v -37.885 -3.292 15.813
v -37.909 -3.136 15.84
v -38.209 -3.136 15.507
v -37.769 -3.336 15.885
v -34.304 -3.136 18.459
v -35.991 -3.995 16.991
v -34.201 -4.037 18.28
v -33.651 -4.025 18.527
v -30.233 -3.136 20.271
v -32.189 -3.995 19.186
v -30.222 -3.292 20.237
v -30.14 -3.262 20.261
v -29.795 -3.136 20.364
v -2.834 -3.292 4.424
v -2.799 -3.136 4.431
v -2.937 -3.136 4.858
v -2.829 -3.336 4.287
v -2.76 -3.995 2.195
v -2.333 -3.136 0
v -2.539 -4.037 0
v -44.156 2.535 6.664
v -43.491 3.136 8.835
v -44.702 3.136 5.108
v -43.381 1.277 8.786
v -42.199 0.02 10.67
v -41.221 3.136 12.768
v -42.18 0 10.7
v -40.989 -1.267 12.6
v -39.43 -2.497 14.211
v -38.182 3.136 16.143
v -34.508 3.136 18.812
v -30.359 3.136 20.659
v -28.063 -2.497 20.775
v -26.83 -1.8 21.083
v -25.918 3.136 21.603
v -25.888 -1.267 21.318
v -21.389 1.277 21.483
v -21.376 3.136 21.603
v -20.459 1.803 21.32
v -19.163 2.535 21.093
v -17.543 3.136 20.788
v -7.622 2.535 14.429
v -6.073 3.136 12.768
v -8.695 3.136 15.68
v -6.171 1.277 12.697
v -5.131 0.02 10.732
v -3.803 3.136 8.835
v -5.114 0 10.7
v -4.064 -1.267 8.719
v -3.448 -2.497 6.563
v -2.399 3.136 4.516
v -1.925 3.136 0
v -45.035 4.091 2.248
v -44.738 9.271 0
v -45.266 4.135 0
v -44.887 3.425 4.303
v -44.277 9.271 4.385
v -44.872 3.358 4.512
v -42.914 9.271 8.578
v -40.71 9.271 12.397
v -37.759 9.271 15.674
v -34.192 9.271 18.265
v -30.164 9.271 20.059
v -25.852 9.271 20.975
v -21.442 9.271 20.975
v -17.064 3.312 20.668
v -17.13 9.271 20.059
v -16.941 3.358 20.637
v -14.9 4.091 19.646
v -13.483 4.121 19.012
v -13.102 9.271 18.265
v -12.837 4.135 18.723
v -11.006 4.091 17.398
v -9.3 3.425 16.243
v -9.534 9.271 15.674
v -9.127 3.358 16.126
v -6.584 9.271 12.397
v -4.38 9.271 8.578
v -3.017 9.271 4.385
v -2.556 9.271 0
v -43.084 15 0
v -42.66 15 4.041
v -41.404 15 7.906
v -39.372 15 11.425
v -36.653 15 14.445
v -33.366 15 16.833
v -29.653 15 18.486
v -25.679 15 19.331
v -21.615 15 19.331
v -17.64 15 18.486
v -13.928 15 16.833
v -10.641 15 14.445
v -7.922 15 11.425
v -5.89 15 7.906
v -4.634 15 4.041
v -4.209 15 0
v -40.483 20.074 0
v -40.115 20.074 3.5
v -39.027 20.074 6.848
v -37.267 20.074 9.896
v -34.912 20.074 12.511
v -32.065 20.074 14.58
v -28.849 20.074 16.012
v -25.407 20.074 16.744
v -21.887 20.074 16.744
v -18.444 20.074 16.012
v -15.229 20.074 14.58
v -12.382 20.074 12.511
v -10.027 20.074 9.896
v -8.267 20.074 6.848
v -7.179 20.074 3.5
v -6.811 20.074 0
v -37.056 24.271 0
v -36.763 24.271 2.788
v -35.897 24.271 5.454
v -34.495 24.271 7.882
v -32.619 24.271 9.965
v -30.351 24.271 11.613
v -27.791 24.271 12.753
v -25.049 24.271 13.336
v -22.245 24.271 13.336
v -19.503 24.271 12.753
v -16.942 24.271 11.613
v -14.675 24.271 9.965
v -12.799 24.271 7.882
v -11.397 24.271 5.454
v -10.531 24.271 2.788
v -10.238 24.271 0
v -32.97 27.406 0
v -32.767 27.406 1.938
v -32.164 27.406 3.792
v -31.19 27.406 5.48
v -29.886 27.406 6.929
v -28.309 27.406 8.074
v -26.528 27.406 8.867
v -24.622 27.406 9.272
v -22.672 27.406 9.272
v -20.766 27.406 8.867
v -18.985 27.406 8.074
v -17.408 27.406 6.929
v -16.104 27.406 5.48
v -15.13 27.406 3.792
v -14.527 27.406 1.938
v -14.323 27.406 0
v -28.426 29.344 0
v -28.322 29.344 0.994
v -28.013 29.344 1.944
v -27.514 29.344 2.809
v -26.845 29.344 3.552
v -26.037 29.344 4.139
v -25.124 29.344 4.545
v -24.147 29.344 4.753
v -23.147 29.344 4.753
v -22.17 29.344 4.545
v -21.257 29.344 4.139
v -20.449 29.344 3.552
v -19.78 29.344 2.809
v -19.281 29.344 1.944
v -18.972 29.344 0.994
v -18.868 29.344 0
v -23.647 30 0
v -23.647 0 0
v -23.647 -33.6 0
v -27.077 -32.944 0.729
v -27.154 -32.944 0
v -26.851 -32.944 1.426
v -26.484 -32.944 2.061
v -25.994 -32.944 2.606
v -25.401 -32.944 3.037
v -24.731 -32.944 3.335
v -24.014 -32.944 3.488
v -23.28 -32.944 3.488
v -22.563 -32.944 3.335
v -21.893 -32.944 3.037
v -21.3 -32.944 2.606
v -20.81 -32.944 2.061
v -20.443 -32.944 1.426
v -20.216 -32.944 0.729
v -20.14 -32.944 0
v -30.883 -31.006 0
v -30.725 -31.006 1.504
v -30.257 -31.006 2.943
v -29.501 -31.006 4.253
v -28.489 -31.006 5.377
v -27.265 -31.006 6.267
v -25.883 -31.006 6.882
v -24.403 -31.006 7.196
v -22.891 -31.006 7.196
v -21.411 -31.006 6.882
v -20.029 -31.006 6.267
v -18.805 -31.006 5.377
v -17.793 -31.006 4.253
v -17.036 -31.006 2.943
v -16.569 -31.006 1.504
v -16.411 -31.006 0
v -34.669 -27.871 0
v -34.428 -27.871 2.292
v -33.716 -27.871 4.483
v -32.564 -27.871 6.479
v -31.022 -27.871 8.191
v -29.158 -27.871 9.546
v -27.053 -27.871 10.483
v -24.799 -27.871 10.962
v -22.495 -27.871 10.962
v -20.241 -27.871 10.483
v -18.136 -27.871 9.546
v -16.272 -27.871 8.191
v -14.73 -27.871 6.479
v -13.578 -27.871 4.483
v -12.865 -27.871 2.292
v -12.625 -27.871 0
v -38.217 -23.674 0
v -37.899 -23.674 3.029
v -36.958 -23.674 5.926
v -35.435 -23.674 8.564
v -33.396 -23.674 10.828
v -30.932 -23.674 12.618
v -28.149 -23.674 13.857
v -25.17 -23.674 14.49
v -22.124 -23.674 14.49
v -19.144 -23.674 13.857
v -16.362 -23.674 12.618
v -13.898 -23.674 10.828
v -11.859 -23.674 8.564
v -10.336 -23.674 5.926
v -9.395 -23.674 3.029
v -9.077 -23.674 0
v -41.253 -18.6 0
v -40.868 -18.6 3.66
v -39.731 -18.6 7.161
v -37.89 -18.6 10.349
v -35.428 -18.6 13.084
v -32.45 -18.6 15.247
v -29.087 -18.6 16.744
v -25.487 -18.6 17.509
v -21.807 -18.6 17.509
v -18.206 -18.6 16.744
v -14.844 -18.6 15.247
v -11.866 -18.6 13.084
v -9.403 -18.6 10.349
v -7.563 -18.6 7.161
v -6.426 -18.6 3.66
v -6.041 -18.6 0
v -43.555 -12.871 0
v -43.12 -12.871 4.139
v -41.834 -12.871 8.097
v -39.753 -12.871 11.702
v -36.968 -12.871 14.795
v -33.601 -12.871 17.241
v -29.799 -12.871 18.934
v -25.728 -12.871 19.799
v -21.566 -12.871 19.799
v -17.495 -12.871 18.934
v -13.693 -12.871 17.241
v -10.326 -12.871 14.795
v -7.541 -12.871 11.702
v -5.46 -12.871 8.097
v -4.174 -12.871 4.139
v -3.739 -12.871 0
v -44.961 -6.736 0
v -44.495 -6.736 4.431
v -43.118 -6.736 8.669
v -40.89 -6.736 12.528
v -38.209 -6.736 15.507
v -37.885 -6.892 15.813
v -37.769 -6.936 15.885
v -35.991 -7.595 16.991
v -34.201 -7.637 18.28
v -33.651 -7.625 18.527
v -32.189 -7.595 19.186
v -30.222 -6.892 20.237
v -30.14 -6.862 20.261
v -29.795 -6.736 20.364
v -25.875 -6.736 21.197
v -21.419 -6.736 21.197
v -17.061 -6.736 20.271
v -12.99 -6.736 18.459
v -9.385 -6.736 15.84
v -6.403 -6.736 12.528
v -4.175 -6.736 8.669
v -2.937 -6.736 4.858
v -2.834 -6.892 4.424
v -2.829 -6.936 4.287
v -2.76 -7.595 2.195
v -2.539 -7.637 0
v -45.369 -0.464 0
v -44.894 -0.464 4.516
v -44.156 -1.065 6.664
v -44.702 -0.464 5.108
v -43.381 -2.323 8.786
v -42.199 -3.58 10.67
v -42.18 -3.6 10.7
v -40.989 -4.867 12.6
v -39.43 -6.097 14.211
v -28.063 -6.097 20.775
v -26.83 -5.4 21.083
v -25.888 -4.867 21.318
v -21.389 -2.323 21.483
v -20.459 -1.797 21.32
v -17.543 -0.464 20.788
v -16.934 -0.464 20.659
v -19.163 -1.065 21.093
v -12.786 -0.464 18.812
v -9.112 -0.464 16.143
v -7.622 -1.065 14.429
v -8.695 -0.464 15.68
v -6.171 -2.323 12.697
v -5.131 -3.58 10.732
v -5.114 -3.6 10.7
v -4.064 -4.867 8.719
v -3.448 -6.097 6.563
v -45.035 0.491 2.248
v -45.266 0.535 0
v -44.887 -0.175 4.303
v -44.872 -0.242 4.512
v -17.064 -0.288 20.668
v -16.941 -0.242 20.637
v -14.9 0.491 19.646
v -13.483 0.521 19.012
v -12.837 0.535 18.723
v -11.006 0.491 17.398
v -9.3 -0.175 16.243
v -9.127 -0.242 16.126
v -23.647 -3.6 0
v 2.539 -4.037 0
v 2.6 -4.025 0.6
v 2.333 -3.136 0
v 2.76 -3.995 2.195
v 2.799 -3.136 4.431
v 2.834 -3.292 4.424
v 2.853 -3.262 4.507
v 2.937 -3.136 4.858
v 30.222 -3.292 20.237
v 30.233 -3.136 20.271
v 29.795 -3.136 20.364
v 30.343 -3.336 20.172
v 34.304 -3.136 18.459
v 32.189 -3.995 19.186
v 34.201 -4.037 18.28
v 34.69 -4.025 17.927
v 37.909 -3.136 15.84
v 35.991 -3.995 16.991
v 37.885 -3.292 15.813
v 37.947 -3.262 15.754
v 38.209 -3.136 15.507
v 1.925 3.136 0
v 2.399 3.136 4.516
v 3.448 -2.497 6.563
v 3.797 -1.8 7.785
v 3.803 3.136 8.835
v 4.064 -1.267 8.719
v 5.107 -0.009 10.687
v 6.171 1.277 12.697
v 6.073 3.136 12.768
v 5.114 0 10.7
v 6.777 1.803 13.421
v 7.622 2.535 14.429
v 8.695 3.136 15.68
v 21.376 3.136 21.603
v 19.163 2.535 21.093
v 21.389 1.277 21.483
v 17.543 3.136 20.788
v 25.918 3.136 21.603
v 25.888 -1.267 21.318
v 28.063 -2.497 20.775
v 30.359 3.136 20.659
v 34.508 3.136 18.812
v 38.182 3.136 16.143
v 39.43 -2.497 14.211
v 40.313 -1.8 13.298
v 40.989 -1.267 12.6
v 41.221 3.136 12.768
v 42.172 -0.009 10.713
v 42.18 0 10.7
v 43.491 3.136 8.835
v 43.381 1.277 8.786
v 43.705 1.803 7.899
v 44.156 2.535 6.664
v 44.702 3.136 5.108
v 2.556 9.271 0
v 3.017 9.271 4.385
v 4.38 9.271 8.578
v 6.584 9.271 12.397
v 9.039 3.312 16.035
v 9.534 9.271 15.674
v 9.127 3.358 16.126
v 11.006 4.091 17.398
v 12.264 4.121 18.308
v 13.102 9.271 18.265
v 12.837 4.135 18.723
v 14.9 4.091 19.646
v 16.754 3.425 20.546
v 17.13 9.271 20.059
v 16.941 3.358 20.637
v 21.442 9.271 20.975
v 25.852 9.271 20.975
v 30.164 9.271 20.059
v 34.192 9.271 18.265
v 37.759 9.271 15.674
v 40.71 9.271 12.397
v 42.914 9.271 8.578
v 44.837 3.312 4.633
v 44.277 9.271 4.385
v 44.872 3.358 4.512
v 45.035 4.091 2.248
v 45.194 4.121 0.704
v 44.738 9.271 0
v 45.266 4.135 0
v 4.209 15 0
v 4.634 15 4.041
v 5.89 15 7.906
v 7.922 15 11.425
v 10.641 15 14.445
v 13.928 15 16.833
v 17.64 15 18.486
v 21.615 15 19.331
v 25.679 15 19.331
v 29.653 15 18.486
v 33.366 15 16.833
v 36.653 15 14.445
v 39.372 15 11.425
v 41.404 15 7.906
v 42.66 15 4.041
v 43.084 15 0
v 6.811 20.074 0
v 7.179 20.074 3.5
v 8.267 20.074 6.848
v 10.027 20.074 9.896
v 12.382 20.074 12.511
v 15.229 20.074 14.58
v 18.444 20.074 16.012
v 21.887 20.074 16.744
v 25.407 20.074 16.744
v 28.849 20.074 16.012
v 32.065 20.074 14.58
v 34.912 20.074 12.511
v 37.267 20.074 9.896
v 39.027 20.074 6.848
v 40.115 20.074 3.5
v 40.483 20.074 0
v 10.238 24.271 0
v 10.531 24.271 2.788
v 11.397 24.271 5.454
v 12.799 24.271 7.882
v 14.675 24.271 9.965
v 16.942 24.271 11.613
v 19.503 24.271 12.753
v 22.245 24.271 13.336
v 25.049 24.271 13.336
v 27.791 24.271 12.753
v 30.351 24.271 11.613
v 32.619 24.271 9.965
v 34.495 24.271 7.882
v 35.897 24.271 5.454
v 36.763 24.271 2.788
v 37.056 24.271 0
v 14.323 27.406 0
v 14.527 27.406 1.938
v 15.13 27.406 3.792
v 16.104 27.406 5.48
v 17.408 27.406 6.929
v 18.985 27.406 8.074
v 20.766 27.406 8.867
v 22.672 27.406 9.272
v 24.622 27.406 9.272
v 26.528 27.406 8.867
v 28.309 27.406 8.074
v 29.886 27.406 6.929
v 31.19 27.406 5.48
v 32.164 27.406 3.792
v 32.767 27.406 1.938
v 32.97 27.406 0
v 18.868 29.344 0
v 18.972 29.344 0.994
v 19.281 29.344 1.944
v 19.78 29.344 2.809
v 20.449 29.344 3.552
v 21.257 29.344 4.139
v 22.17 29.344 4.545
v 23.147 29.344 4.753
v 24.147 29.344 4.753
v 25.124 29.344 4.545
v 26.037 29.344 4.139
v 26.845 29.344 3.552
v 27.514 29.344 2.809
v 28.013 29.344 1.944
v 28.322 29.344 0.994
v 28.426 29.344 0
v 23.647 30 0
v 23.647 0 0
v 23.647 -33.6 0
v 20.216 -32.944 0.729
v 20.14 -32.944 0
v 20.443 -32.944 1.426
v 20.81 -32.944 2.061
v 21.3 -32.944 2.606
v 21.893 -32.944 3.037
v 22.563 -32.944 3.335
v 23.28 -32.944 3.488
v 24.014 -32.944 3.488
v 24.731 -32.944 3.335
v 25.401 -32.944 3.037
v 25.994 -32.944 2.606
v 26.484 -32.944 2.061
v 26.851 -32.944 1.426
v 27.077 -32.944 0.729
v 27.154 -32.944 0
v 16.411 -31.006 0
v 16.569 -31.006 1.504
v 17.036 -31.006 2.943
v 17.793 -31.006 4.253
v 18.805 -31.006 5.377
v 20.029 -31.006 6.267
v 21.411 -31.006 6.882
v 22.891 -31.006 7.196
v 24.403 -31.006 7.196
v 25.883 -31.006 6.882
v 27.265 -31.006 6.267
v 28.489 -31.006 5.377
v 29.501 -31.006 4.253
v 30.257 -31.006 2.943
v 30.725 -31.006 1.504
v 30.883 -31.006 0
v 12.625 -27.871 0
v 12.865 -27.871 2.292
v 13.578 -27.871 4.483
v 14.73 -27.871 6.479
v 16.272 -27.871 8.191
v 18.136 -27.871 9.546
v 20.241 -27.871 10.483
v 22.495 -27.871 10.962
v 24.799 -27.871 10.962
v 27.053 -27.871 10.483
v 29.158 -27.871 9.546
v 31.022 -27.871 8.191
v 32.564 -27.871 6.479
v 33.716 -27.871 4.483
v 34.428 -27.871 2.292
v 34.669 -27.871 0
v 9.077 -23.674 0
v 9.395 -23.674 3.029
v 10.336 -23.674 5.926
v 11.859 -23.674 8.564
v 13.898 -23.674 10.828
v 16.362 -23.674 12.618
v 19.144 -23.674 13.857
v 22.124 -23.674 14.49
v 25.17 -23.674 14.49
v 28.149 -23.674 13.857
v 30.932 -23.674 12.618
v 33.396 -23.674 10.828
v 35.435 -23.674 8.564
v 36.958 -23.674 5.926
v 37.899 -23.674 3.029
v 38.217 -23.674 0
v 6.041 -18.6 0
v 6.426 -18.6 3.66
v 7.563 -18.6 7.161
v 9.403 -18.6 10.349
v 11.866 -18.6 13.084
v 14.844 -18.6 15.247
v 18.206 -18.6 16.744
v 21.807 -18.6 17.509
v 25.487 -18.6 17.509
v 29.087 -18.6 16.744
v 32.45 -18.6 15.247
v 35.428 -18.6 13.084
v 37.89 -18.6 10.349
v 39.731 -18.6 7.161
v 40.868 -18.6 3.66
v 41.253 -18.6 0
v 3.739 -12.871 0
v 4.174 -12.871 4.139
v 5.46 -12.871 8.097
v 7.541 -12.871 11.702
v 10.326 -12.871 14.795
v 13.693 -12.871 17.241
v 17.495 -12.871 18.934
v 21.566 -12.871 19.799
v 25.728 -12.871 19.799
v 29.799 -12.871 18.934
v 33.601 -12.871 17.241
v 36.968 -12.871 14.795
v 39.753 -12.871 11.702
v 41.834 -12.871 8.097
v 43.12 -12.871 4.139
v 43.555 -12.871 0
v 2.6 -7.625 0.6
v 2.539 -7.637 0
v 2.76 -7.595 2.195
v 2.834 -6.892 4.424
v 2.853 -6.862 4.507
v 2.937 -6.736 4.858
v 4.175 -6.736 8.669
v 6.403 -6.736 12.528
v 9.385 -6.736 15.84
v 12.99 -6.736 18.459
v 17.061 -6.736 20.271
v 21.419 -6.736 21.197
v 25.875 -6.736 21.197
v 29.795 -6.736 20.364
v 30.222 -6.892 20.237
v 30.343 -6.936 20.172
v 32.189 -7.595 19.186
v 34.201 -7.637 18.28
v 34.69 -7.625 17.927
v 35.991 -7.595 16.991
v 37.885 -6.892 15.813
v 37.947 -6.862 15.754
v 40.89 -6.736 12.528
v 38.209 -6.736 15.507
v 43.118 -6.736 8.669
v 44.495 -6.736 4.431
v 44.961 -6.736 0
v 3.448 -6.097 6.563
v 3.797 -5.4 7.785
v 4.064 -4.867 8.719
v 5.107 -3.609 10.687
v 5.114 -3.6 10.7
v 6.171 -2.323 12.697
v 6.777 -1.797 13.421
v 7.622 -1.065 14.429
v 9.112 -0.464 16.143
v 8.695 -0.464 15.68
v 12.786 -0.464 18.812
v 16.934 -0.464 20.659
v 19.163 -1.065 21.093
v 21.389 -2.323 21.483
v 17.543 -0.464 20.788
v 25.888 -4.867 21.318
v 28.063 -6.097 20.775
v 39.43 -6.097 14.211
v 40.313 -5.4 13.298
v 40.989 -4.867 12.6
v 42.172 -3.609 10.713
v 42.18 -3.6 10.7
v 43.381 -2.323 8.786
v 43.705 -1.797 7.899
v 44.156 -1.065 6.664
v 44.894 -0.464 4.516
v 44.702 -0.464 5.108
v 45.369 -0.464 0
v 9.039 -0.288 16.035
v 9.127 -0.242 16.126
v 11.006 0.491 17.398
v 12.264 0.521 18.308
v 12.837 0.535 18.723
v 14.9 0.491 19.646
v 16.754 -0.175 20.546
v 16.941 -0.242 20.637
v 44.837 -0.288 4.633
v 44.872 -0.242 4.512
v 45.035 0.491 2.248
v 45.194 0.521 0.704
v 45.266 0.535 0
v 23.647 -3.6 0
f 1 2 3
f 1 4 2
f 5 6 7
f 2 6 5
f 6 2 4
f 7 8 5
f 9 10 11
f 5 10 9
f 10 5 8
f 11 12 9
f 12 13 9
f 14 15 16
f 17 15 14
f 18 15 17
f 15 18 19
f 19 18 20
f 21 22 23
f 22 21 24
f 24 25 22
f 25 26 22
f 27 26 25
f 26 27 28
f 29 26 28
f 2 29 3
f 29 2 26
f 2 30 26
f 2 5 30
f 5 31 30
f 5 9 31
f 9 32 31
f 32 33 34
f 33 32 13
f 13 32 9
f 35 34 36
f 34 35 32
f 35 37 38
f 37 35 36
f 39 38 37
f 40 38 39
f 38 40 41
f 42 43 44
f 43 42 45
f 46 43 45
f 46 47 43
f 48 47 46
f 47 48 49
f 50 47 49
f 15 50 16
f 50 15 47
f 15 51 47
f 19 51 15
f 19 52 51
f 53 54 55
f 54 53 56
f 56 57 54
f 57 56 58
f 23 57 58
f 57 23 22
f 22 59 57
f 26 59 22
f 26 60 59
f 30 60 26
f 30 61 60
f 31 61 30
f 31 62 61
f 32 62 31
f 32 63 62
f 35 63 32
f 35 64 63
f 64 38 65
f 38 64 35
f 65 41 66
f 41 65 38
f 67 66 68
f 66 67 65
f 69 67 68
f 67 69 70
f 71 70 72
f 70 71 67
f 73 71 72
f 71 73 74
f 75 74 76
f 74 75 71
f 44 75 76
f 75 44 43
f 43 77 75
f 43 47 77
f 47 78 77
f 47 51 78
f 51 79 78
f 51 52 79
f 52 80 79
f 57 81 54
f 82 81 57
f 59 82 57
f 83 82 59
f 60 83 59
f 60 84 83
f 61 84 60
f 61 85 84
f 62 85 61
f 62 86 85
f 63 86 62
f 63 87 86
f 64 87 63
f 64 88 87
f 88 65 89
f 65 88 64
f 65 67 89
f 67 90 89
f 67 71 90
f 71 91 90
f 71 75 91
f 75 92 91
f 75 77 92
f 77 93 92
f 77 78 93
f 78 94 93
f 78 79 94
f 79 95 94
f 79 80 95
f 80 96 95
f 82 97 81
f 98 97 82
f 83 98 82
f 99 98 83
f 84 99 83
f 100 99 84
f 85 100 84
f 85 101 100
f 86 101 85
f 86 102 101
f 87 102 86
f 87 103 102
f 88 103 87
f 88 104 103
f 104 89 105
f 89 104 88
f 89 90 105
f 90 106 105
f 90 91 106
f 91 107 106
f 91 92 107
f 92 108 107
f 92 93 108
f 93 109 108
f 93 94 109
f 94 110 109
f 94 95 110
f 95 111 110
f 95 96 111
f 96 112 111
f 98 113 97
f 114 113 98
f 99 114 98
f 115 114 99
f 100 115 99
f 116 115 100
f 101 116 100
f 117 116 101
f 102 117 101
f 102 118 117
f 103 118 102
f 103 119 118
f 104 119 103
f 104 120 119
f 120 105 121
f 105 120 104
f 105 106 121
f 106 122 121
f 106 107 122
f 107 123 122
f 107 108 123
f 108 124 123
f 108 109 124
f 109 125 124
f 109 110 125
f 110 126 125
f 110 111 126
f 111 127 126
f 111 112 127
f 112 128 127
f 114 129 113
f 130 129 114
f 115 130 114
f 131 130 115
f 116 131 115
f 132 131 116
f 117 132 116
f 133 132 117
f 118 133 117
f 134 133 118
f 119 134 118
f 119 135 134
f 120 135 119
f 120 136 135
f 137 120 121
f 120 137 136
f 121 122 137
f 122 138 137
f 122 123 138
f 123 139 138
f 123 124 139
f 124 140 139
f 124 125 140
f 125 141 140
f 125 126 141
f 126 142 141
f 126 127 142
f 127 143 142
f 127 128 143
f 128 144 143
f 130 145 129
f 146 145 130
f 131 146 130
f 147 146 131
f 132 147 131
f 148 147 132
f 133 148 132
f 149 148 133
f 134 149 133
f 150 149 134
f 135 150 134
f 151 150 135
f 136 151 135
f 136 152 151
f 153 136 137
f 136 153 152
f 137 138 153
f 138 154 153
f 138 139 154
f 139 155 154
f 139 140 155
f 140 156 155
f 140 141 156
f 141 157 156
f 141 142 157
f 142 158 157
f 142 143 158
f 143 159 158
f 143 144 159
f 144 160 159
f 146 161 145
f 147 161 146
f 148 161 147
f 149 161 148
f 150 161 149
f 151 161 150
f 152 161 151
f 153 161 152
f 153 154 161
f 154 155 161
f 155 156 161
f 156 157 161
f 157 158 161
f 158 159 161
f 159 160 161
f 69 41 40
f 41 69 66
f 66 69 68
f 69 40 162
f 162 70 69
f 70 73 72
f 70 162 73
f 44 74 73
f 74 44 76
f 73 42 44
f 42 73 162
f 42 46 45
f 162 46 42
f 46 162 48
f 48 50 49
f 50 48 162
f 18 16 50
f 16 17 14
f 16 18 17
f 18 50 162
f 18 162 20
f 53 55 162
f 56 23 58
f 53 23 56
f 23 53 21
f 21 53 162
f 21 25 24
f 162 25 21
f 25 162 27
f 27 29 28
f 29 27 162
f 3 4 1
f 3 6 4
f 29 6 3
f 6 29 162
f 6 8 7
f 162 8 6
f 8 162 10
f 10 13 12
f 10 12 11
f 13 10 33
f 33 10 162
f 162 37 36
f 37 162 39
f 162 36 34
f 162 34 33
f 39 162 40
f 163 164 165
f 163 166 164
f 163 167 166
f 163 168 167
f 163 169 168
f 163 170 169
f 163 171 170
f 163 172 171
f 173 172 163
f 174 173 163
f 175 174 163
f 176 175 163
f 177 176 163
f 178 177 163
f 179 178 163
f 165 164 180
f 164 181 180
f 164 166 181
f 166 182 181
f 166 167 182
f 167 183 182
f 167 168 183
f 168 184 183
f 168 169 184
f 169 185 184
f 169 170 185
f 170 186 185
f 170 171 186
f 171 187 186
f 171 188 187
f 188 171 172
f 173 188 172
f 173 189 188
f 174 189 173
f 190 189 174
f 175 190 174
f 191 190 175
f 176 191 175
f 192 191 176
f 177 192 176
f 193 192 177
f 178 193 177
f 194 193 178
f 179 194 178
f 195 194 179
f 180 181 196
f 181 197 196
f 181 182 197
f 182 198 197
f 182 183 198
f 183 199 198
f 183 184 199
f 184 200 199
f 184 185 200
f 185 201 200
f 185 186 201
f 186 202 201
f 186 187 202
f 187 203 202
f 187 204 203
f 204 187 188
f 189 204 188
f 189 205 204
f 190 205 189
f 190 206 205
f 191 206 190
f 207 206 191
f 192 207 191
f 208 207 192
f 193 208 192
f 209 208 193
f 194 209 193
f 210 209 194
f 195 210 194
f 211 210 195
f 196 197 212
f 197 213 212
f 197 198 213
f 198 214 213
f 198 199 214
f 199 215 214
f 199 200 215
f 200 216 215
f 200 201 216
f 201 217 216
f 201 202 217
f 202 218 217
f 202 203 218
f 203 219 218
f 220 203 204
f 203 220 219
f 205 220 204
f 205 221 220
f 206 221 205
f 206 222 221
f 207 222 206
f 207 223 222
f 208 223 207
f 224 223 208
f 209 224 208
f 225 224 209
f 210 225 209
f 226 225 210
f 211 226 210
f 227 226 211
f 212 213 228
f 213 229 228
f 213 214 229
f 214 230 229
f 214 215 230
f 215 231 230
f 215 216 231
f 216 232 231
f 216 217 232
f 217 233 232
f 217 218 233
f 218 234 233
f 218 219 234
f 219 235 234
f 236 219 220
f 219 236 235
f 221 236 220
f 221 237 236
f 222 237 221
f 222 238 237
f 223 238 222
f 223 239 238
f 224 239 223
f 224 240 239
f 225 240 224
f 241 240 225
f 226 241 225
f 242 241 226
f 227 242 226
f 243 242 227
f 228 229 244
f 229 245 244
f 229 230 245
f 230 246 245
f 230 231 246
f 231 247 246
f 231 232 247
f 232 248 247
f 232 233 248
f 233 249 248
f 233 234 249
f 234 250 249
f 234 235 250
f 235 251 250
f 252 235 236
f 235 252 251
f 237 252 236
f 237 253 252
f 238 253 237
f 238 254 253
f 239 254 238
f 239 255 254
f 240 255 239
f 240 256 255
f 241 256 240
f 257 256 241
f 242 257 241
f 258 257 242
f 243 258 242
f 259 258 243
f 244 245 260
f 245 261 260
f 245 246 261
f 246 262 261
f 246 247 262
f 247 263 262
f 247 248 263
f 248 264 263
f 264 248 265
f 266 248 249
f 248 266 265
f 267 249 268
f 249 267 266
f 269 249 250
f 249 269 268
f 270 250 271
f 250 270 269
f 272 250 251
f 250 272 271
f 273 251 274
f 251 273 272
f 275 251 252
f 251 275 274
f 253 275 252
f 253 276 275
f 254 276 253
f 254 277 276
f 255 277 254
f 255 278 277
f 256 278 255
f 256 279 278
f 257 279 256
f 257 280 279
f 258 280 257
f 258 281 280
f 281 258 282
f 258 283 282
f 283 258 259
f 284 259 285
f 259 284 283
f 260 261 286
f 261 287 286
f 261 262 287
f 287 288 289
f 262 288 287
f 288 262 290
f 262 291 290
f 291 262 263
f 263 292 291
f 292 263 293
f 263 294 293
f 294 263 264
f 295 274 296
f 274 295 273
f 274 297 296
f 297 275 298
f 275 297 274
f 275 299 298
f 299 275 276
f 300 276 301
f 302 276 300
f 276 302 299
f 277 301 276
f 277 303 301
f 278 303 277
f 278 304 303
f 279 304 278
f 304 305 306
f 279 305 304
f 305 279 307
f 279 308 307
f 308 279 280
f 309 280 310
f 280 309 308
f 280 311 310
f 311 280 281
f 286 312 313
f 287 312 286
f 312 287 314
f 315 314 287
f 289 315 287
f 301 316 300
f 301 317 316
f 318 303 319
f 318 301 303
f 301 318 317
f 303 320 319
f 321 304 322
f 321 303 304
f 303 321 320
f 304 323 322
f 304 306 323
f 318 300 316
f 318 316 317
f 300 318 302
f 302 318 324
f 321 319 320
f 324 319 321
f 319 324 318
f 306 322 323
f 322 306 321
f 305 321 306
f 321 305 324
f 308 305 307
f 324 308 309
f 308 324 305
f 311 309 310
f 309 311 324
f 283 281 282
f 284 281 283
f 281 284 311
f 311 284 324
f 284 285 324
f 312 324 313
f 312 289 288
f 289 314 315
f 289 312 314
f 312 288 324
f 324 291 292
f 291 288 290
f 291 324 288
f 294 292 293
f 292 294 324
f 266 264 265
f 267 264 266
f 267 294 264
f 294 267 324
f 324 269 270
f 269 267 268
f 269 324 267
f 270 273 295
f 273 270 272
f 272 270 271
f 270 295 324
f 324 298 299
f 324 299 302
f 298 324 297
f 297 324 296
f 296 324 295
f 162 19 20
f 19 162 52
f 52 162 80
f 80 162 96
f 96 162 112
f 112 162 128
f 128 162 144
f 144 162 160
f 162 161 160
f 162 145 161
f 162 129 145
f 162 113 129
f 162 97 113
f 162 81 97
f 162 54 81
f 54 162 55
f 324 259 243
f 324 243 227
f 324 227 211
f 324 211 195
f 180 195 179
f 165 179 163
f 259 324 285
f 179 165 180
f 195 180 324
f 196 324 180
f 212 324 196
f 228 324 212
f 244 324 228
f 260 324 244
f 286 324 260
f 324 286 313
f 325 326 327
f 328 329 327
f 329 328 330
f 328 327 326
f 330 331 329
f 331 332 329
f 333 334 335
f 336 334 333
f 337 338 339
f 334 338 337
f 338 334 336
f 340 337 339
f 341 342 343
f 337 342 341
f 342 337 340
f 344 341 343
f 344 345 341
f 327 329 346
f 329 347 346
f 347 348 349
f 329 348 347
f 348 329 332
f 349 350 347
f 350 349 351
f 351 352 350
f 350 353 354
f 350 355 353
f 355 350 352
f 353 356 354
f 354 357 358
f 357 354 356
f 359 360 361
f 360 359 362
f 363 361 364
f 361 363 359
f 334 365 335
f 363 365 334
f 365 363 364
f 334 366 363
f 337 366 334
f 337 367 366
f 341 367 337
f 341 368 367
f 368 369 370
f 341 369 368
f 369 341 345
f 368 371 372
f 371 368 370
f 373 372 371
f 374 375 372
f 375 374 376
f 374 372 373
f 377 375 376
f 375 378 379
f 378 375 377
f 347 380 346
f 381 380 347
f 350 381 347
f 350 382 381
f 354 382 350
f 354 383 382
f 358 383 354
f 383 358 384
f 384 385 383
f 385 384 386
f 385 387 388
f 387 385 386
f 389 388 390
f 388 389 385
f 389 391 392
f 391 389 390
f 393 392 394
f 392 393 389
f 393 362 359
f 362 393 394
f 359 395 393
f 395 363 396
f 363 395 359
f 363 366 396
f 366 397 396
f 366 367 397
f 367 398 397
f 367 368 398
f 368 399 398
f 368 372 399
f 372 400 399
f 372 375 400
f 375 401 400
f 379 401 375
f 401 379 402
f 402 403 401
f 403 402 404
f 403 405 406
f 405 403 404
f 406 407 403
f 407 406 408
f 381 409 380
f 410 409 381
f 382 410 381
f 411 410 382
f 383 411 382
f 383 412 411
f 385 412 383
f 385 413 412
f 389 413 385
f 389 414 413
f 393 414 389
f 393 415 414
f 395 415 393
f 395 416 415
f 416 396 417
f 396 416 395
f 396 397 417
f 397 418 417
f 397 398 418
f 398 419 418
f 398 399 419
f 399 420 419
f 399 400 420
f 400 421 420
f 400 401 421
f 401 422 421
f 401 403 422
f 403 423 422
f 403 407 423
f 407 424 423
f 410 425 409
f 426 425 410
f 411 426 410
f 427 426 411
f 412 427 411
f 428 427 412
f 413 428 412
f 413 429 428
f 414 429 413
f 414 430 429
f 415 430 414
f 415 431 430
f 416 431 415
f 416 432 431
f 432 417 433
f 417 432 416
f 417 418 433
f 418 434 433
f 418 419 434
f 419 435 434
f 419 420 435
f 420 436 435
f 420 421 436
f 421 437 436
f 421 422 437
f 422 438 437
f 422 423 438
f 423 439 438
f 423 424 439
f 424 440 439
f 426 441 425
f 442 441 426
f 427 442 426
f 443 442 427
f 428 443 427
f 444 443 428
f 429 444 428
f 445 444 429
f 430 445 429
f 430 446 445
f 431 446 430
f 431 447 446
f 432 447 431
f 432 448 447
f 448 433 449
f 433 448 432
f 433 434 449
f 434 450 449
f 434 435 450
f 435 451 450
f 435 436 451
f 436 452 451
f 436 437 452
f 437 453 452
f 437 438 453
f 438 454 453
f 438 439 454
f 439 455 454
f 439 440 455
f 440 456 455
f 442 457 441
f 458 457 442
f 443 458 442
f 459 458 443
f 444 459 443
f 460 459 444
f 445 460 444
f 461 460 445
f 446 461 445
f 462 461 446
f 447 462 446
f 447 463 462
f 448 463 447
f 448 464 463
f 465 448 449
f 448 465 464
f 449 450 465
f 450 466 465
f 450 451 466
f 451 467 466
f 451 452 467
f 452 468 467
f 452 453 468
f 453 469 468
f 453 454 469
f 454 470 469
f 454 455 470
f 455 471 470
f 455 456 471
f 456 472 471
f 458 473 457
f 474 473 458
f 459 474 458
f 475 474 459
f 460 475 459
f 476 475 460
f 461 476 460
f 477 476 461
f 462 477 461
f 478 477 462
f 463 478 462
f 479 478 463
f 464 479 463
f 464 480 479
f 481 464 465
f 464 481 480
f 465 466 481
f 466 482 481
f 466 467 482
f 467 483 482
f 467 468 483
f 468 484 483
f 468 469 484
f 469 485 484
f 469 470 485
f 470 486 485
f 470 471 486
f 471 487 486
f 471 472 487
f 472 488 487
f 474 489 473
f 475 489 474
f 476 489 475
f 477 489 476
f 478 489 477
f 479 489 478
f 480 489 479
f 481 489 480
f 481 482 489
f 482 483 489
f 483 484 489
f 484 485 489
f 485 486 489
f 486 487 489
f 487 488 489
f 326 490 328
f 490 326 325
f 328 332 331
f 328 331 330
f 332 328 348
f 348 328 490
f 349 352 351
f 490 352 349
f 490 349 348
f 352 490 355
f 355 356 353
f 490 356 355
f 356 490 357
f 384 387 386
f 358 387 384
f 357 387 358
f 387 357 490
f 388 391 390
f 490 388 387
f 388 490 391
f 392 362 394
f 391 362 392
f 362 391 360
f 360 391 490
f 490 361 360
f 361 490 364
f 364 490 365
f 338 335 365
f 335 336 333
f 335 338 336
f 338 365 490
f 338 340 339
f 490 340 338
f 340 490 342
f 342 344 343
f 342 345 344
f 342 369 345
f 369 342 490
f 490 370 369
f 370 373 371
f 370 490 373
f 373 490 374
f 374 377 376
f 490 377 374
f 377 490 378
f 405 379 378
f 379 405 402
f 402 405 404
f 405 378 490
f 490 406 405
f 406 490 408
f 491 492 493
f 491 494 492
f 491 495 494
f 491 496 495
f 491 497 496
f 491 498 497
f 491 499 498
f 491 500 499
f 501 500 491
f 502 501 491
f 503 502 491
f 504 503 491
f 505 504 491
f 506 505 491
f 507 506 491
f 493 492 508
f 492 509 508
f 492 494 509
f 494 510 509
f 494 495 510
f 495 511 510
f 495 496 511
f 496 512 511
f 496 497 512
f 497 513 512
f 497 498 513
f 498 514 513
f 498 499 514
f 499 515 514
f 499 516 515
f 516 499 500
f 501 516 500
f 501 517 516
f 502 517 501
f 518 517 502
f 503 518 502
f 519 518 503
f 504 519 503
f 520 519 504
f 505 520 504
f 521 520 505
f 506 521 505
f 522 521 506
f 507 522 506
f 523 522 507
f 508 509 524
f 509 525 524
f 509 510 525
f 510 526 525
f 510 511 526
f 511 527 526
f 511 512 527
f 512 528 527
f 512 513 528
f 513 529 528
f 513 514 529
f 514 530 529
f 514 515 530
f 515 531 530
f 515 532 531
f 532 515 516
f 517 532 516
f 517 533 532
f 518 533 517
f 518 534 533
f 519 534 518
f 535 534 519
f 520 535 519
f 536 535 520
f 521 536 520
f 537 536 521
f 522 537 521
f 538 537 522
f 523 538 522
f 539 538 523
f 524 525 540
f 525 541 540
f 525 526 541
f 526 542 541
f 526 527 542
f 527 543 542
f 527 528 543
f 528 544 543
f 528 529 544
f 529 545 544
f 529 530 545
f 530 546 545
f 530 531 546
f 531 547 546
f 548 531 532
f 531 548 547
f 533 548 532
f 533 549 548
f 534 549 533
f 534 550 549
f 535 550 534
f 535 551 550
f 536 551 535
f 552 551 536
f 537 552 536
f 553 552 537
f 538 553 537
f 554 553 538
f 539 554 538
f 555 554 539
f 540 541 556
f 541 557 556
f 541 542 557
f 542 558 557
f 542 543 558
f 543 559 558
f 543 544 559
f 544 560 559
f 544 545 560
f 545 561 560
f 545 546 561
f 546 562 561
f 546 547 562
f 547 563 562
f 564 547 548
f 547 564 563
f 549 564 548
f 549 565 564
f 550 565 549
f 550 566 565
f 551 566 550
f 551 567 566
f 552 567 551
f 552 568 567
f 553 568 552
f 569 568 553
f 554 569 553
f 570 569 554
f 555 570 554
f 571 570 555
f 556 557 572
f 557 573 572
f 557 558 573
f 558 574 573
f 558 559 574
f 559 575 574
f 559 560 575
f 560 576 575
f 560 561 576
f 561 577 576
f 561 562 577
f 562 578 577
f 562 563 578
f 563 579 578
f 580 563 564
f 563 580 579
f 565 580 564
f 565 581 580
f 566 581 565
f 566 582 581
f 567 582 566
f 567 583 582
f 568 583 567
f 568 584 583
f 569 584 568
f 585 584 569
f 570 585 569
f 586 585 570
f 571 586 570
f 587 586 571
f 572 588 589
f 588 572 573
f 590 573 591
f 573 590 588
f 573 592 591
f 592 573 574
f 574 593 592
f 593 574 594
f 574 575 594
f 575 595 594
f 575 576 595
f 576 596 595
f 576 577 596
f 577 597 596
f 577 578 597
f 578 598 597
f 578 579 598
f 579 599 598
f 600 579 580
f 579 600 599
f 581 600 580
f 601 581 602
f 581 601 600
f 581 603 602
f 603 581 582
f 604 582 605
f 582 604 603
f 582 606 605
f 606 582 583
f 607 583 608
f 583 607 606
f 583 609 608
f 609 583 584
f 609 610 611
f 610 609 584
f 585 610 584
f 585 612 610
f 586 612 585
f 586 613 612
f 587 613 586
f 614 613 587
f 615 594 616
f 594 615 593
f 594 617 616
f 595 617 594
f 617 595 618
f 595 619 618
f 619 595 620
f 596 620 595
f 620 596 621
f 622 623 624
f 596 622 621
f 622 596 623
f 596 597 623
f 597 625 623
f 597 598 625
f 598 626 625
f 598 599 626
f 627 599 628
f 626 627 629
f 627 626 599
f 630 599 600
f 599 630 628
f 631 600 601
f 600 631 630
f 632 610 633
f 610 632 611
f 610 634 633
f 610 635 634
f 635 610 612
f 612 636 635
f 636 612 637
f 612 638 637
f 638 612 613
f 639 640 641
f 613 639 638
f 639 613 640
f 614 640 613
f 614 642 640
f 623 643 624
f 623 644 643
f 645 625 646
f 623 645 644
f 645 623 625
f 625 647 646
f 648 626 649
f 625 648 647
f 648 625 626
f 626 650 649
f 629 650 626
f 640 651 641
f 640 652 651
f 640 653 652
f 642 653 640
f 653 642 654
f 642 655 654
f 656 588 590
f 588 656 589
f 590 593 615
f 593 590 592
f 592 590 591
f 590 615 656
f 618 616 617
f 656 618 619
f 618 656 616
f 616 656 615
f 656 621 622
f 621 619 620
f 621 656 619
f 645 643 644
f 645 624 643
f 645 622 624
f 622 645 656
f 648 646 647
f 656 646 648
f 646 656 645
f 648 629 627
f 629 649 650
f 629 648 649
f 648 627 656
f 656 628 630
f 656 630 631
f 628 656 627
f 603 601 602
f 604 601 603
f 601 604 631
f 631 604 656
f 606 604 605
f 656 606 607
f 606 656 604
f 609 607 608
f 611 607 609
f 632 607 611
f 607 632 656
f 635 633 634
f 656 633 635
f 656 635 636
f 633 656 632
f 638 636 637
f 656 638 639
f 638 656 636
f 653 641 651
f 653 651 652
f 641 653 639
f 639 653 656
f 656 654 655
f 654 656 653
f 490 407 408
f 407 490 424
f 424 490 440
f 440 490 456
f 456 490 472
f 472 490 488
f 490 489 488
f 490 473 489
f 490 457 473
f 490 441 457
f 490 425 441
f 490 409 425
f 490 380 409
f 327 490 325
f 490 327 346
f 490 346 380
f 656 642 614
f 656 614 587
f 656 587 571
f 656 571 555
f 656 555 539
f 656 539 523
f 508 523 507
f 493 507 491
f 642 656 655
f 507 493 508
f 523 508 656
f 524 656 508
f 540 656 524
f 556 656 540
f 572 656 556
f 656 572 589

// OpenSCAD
//Easter Egg Maker 2016 from Richard Swika'
//Rev: 1.3.28.0 - centered abssin function for more even pieces
//Rev: 1.3.27.0 - first version
//2014-2016 Richard Swika -  Creative Commons - Attribution - Non-Commercial license.

/* [EggOMatic] */
//use 1 for draft; turn up to 5 for best quality but slower regenerate
Quality=1; //[1:5]

//number of pieces cut across long axis of egg
AxleSliceCount=2; //[1:10]

//type of wave used for cutter (does not apply for flat cutter)
Shape="sin"; //[sin,abssin,tri,saw,square]

//type of cutter used on long axis of egg
Cutter="radial"; //[flat,linear,radial]

//Number of cycles for cutter wave
Cycles=3; //[1:16]

//Relative amplitude of cutter wave (normally keep this at 1 or 2, depending on slice count)
Amp=2; //[0:9]

//number of rotary slices (normally keep this at 2; use caution with values greater than 2)
RotarySliceCount=2; //[2:12]

Samples=Quality*10*Cycles;

/* [Size and Shape] */

//Length of the egg (mm)?.
egg_length=60; //[30:200]

//What shape egg? (use 7 for a hen egg; 0 for a sphere; 100 for a blimp)
egg_shape=7; //[0:100]

/* [Hidden] */
// preview[view:top, tilt:top]
tiny=0.001;
space=2; //2 mm between parts on build plate

//set true to turn off the demo egg so you can use the modules instead
moduleMode=false; //[false,true];

//when false the egg will have quads where possible instead of all trigons
//this can lead to problems with non-plannar surfaces when using csg
//so only use it true if when not using a base
allTrigon=true; //[false,true]
ucount=30*Quality;
vcount=15*Quality;

function ud(ui) = ui*360/ucount;
function vd(vi) = vi*180/vcount;

//egg equation adapted from http://www16.ocn.ne.jp/~akiko-y/Egg
//(y^2 + z^2)^2=4z^3 + (4-4c)zy^2
// c=0.7 produces an almost perfect hen egg outline+
// c=0 produces a perfect sphere
// c>1 produces an elongated egg shape
//z ranges from 0 to 1
function egg_outline(c,z)= z >=1 ? 0 : (sqrt(4-4*c-8*z+sqrt(64*c*z+pow(4-4*c,2)))*sqrt(4*z)/sqrt(2))/4;

//map the egg's surface from uv to xyz with these functions
//function x(ui,r) = r * sin(ui*360/(ucount-1));
function x(ui,r) = r * sin(ud(ui));
function y(ui,r) = r * cos(ud(ui));
function z(vi,r) = r * cos(vd(vi));	
function n(vi,r) = r * sin(vd(vi));	
function zi(vi) = (1+cos(vd(vi)))/2;	
center = 0.5; //set to 1 to center at small end; 0 to center on fat end

//to avoid degenerate geometry at the poles we can not use quads 
//so we will generate phantom points as if we were using quads, but use tris instead 
//just to simplify indexing, but will only link faces to a single point at each pole
//but we will use the phantom points to calculate average displacement at each pole
//lets make an egg
points = [ for (vi=[0:vcount]) 
    for (ui = [0 : ucount-1]) 
        let (r=egg_outline(egg_shape/10,1-zi(vi))) 
                    [x(ui,r), y(ui,r),(zi(vi))-center]];
//echo(points=points);
faces =  (allTrigon)     
 ? [ for (vi=[0:vcount-1]) for (ui = [0:ucount-1])  for (p=[0:1])
    (vi==0)&&(p==0) ? [vi*ucount,ui+(vi+1)*ucount,(ui+1) % ucount+(vi+1)*ucount]
    : (vi==vcount-1)&&(p==0) ? [(ui+1) % ucount+vi*ucount,ui+vi*ucount,(vi+1)*ucount]
    : (p==0) ? [(ui+1) % ucount+vi*ucount,ui+vi*ucount,ui+(vi+1)*ucount]
    :[(ui+1) % ucount+vi*ucount,ui+(vi+1)*ucount,(ui+1)%ucount+(vi+1)*ucount]] 
: [ for (vi=[0:vcount-1]) for (ui = [0:ucount-1])  
    (vi==0) ? [vi*ucount,ui+(vi+1)*ucount,(ui+1) % ucount+(vi+1)*ucount]
    : (vi==vcount-1) ? [(ui+1) % ucount+vi*ucount,ui+vi*ucount,(vi+1)*ucount]
    : [(ui+1) % ucount+vi*ucount,ui+vi*ucount,ui+(vi+1)*ucount,(ui+1)%ucount+(vi+1)*ucount]] ;
//echo(faces=faces);

//an adjustable Egg
module Egg(egg_length=egg_length,egg_shape=egg_shape){
     scale (egg_length) rotate([0,0,-90]) polyhedron(points=points,faces=faces);
}    

//2016 "Egg-O-Matic" Code follows
function frac(x)=x-floor(x);
//All "fancy" cuts are done with these wave functions
function wave(kind,x) = kind=="sin" ? sin(x*180) : 
                                      kind=="abssin" ? 2*abs(sin(x*180))-1:
                                      kind=="square" ? (frac(x)<0.5?1:-1): 
                                      kind=="saw" ? (2*frac(x)-1): 
                                      kind=="tri" ? (frac(x)<0.5?-1+frac(x)*4 : 3-frac(x)*4) : x-floor(x);

//Declare a blade to make fancy linear cuts
module linearCutter(Shape="tri",Cycles=1,Amp=1,Samples=100){
    bottom=[for (x=[-1.05:1/Samples:1.05]) [x,1+(Amp+Amp*wave(Shape,x*Cycles))/10]];
    top = [[1.05,-1],[-1.05,-1]];
    color("red")
    rotate([-90,0,0]) 
    translate([0,0,-1])
        linear_extrude(height = 2)
            polygon(points=concat(bottom,top));
}
//Declare a blade to make fancy radial cuts
module radialCutter(Shape="abssin",Cycles=3,Amp=1,Samples=160){
    lowerpoints = concat([[0,0,-1-Amp/10]],
                        [ for (i=[0:1/Samples:1-1/Samples+tiny])[sin(i*360),
                            cos(i*360),-1-(Amp+Amp*wave(Shape,i*2*Cycles))/10]]);
    upperpoints = concat([[0,0,1]],
                        [ for (i=[0:1/Samples:1-1/Samples+tiny])[sin(i*360),cos(i*360),1]]);
   cutterpoints = concat(lowerpoints,upperpoints);
   //echo (cutterpoints);
   lowerfaces = [ for (i=[1:Samples])  [0,i==Samples ? 1 : i+1,i]]; //normals reversed
   upperfaces = [ for (i=[Samples+2:2*Samples+1])  [Samples+1,i,i==Samples*2+1 ? Samples+2 : i+1]];
   endfacesquad= [for (i=[1:Samples-1])  [i,i+1,i+Samples+2,i+Samples+1]];
   cutterfaces = concat(lowerfaces,upperfaces,endfacesquad,[[Samples,1,Samples+2,Samples*2+1]]);    
   //echo("faces:",upperfaces);
    color("red")
    polyhedron(cutterpoints,cutterfaces);
}

//allow the various cutters to be selected 
module multiCutter(Cutter="flat",Shape="sin",Cycles=3,Amp=1,Samples=160){
    if (Cutter=="radial")
       radialCutter(Shape,Cycles,Amp,Samples);
    else if (Cutter=="linear")
       linearCutter(Shape,Cycles,Amp,Samples);
    else //Flat cutter uses a cube
       cube(2,center=true);
}

module subSlice(z,deltaZ,n) //part, cutter
{
    //slice off a section
    translate([0,0,z/10])
    difference(){
        children(0); //Part
        children(1); //Cutter
    }
    //continue slicing up the remainder 
    if (n>1) {
        subSlice(z+deltaZ,deltaZ,n-1) {
            intersection(){//Part advanced one step (section above removed)
                children(0); //Part
                children(1); //Cutter           
            }
        translate([0,0,deltaZ]) children(1); //Advanced cutter one step
        }
    }
}

//declare an operator to recursively slice a part into N sections
//it operates on two children, the part to be sliced and the cutter
//the part and cutter must be at the origin
//the cutter must be positioned surrounding the part with the cutting edge on
//the negative Z axis not touching the part
//Scale is 1 for a bounding box of radius 1
module sliceOmatic(N=1,Scale=1,Amp=1) //part cutter
{
   deltaZ= (Cutter=="flat") ? Scale*2/N : Scale*(2+Amp/5)/N;
   subSlice(0,deltaZ,N) {
       children(0); //Part(s)
       translate([0,0,deltaZ]) children(1); //Advance cutter one step
   }
}

//rotary-slice a section from the part from A0 to A1 and align it for printing
module rotarySlice(A0=90,A1=120,Scale=1) //part
{
    rotate([0,0,-A0])
    intersection(){
        children();
        difference() {
            rotate([0,0,A0]) translate([0,Scale,0]) cube(2*Scale,center=true);
            rotate([0,0,A1]) translate([0,Scale,0]) cube(2*Scale,center=true);
        }
    }
}
//slice the part into N sections by rotating a straight cutter about the Z axis
module rotarySlicer(N=2,Scale=1) //part
{
    //figure out where to place the first section and the spacing between them
    spacefactor = N==2 ? 2 : 1.5; //pack sections without overlapping
    spacedelta=spacefactor*(space+Scale*egg_outline(egg_shape/10,0.5));
    spaceoffset = -spacedelta*((N/2)-1/2);
    if (N<2) children();
        else {
            delta=360/N;
            for (n=[0:N-1]) {
                translate([spaceoffset+spacedelta*n ,0,0]) rotarySlice(n*delta,(n+1)*delta,Scale) children();
            }
        }  
}

//this generates the main object
if (!moduleMode) {
     rotate([90,0,0]) //flat on build plate
      rotarySlicer(RotarySliceCount,Scale=egg_length)
         sliceOmatic(AxleSliceCount,egg_length/2,Amp) 
    {
                   Egg();
//                   translate([egg_length/2,0,0])
                        scale(egg_length/2) multiCutter(Cutter,Shape,Cycles,Amp,Samples);
    }
 }



